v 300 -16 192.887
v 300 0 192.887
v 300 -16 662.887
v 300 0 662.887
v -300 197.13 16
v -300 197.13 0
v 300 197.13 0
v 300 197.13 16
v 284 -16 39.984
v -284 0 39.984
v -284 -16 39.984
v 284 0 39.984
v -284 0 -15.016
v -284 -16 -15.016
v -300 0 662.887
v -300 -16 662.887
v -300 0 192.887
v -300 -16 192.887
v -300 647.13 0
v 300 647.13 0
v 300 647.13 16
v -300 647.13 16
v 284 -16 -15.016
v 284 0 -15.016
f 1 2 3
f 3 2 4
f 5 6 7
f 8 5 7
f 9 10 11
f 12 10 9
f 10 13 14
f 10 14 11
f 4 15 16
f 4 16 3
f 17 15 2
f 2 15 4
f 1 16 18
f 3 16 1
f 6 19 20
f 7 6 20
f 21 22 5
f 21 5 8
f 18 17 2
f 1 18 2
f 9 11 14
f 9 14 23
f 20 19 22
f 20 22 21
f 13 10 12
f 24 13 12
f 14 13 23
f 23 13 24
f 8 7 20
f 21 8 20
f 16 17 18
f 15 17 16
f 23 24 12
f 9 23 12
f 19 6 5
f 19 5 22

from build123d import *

# Parameters (mm, degrees)
F1_W     = 568
F1_H     = 55
F2_DEPTH = 16
F3_W     = 600
F3_H     = 450
F4_DEPTH = 16
F5_W     = 600
F5_H     = 470
F6_DEPTH = 16


with BuildPart() as f2:
    # F1 (on Front) → F2 (new body)
    with BuildSketch(Plane.XZ):
        with Locations((0, 12.4838852164)):
            Rectangle(F1_W, F1_H)
    extrude(amount=F2_DEPTH)


with BuildPart() as f4:
    # F3 (on Top) → F4 (new body)
    with BuildSketch(Plane.XY):
        with Locations((0, 422.1297264099)):
            Rectangle(F3_W, F3_H)
    extrude(amount=F4_DEPTH)


with BuildPart() as f6:
    # F5 (on Front) → F6 (new body)
    with BuildSketch(Plane.XZ):
        with Locations((0, 427.887455225)):
            Rectangle(F5_W, F5_H)
    extrude(amount=F6_DEPTH)


solid = Compound([f2.part, f4.part, f6.part])
